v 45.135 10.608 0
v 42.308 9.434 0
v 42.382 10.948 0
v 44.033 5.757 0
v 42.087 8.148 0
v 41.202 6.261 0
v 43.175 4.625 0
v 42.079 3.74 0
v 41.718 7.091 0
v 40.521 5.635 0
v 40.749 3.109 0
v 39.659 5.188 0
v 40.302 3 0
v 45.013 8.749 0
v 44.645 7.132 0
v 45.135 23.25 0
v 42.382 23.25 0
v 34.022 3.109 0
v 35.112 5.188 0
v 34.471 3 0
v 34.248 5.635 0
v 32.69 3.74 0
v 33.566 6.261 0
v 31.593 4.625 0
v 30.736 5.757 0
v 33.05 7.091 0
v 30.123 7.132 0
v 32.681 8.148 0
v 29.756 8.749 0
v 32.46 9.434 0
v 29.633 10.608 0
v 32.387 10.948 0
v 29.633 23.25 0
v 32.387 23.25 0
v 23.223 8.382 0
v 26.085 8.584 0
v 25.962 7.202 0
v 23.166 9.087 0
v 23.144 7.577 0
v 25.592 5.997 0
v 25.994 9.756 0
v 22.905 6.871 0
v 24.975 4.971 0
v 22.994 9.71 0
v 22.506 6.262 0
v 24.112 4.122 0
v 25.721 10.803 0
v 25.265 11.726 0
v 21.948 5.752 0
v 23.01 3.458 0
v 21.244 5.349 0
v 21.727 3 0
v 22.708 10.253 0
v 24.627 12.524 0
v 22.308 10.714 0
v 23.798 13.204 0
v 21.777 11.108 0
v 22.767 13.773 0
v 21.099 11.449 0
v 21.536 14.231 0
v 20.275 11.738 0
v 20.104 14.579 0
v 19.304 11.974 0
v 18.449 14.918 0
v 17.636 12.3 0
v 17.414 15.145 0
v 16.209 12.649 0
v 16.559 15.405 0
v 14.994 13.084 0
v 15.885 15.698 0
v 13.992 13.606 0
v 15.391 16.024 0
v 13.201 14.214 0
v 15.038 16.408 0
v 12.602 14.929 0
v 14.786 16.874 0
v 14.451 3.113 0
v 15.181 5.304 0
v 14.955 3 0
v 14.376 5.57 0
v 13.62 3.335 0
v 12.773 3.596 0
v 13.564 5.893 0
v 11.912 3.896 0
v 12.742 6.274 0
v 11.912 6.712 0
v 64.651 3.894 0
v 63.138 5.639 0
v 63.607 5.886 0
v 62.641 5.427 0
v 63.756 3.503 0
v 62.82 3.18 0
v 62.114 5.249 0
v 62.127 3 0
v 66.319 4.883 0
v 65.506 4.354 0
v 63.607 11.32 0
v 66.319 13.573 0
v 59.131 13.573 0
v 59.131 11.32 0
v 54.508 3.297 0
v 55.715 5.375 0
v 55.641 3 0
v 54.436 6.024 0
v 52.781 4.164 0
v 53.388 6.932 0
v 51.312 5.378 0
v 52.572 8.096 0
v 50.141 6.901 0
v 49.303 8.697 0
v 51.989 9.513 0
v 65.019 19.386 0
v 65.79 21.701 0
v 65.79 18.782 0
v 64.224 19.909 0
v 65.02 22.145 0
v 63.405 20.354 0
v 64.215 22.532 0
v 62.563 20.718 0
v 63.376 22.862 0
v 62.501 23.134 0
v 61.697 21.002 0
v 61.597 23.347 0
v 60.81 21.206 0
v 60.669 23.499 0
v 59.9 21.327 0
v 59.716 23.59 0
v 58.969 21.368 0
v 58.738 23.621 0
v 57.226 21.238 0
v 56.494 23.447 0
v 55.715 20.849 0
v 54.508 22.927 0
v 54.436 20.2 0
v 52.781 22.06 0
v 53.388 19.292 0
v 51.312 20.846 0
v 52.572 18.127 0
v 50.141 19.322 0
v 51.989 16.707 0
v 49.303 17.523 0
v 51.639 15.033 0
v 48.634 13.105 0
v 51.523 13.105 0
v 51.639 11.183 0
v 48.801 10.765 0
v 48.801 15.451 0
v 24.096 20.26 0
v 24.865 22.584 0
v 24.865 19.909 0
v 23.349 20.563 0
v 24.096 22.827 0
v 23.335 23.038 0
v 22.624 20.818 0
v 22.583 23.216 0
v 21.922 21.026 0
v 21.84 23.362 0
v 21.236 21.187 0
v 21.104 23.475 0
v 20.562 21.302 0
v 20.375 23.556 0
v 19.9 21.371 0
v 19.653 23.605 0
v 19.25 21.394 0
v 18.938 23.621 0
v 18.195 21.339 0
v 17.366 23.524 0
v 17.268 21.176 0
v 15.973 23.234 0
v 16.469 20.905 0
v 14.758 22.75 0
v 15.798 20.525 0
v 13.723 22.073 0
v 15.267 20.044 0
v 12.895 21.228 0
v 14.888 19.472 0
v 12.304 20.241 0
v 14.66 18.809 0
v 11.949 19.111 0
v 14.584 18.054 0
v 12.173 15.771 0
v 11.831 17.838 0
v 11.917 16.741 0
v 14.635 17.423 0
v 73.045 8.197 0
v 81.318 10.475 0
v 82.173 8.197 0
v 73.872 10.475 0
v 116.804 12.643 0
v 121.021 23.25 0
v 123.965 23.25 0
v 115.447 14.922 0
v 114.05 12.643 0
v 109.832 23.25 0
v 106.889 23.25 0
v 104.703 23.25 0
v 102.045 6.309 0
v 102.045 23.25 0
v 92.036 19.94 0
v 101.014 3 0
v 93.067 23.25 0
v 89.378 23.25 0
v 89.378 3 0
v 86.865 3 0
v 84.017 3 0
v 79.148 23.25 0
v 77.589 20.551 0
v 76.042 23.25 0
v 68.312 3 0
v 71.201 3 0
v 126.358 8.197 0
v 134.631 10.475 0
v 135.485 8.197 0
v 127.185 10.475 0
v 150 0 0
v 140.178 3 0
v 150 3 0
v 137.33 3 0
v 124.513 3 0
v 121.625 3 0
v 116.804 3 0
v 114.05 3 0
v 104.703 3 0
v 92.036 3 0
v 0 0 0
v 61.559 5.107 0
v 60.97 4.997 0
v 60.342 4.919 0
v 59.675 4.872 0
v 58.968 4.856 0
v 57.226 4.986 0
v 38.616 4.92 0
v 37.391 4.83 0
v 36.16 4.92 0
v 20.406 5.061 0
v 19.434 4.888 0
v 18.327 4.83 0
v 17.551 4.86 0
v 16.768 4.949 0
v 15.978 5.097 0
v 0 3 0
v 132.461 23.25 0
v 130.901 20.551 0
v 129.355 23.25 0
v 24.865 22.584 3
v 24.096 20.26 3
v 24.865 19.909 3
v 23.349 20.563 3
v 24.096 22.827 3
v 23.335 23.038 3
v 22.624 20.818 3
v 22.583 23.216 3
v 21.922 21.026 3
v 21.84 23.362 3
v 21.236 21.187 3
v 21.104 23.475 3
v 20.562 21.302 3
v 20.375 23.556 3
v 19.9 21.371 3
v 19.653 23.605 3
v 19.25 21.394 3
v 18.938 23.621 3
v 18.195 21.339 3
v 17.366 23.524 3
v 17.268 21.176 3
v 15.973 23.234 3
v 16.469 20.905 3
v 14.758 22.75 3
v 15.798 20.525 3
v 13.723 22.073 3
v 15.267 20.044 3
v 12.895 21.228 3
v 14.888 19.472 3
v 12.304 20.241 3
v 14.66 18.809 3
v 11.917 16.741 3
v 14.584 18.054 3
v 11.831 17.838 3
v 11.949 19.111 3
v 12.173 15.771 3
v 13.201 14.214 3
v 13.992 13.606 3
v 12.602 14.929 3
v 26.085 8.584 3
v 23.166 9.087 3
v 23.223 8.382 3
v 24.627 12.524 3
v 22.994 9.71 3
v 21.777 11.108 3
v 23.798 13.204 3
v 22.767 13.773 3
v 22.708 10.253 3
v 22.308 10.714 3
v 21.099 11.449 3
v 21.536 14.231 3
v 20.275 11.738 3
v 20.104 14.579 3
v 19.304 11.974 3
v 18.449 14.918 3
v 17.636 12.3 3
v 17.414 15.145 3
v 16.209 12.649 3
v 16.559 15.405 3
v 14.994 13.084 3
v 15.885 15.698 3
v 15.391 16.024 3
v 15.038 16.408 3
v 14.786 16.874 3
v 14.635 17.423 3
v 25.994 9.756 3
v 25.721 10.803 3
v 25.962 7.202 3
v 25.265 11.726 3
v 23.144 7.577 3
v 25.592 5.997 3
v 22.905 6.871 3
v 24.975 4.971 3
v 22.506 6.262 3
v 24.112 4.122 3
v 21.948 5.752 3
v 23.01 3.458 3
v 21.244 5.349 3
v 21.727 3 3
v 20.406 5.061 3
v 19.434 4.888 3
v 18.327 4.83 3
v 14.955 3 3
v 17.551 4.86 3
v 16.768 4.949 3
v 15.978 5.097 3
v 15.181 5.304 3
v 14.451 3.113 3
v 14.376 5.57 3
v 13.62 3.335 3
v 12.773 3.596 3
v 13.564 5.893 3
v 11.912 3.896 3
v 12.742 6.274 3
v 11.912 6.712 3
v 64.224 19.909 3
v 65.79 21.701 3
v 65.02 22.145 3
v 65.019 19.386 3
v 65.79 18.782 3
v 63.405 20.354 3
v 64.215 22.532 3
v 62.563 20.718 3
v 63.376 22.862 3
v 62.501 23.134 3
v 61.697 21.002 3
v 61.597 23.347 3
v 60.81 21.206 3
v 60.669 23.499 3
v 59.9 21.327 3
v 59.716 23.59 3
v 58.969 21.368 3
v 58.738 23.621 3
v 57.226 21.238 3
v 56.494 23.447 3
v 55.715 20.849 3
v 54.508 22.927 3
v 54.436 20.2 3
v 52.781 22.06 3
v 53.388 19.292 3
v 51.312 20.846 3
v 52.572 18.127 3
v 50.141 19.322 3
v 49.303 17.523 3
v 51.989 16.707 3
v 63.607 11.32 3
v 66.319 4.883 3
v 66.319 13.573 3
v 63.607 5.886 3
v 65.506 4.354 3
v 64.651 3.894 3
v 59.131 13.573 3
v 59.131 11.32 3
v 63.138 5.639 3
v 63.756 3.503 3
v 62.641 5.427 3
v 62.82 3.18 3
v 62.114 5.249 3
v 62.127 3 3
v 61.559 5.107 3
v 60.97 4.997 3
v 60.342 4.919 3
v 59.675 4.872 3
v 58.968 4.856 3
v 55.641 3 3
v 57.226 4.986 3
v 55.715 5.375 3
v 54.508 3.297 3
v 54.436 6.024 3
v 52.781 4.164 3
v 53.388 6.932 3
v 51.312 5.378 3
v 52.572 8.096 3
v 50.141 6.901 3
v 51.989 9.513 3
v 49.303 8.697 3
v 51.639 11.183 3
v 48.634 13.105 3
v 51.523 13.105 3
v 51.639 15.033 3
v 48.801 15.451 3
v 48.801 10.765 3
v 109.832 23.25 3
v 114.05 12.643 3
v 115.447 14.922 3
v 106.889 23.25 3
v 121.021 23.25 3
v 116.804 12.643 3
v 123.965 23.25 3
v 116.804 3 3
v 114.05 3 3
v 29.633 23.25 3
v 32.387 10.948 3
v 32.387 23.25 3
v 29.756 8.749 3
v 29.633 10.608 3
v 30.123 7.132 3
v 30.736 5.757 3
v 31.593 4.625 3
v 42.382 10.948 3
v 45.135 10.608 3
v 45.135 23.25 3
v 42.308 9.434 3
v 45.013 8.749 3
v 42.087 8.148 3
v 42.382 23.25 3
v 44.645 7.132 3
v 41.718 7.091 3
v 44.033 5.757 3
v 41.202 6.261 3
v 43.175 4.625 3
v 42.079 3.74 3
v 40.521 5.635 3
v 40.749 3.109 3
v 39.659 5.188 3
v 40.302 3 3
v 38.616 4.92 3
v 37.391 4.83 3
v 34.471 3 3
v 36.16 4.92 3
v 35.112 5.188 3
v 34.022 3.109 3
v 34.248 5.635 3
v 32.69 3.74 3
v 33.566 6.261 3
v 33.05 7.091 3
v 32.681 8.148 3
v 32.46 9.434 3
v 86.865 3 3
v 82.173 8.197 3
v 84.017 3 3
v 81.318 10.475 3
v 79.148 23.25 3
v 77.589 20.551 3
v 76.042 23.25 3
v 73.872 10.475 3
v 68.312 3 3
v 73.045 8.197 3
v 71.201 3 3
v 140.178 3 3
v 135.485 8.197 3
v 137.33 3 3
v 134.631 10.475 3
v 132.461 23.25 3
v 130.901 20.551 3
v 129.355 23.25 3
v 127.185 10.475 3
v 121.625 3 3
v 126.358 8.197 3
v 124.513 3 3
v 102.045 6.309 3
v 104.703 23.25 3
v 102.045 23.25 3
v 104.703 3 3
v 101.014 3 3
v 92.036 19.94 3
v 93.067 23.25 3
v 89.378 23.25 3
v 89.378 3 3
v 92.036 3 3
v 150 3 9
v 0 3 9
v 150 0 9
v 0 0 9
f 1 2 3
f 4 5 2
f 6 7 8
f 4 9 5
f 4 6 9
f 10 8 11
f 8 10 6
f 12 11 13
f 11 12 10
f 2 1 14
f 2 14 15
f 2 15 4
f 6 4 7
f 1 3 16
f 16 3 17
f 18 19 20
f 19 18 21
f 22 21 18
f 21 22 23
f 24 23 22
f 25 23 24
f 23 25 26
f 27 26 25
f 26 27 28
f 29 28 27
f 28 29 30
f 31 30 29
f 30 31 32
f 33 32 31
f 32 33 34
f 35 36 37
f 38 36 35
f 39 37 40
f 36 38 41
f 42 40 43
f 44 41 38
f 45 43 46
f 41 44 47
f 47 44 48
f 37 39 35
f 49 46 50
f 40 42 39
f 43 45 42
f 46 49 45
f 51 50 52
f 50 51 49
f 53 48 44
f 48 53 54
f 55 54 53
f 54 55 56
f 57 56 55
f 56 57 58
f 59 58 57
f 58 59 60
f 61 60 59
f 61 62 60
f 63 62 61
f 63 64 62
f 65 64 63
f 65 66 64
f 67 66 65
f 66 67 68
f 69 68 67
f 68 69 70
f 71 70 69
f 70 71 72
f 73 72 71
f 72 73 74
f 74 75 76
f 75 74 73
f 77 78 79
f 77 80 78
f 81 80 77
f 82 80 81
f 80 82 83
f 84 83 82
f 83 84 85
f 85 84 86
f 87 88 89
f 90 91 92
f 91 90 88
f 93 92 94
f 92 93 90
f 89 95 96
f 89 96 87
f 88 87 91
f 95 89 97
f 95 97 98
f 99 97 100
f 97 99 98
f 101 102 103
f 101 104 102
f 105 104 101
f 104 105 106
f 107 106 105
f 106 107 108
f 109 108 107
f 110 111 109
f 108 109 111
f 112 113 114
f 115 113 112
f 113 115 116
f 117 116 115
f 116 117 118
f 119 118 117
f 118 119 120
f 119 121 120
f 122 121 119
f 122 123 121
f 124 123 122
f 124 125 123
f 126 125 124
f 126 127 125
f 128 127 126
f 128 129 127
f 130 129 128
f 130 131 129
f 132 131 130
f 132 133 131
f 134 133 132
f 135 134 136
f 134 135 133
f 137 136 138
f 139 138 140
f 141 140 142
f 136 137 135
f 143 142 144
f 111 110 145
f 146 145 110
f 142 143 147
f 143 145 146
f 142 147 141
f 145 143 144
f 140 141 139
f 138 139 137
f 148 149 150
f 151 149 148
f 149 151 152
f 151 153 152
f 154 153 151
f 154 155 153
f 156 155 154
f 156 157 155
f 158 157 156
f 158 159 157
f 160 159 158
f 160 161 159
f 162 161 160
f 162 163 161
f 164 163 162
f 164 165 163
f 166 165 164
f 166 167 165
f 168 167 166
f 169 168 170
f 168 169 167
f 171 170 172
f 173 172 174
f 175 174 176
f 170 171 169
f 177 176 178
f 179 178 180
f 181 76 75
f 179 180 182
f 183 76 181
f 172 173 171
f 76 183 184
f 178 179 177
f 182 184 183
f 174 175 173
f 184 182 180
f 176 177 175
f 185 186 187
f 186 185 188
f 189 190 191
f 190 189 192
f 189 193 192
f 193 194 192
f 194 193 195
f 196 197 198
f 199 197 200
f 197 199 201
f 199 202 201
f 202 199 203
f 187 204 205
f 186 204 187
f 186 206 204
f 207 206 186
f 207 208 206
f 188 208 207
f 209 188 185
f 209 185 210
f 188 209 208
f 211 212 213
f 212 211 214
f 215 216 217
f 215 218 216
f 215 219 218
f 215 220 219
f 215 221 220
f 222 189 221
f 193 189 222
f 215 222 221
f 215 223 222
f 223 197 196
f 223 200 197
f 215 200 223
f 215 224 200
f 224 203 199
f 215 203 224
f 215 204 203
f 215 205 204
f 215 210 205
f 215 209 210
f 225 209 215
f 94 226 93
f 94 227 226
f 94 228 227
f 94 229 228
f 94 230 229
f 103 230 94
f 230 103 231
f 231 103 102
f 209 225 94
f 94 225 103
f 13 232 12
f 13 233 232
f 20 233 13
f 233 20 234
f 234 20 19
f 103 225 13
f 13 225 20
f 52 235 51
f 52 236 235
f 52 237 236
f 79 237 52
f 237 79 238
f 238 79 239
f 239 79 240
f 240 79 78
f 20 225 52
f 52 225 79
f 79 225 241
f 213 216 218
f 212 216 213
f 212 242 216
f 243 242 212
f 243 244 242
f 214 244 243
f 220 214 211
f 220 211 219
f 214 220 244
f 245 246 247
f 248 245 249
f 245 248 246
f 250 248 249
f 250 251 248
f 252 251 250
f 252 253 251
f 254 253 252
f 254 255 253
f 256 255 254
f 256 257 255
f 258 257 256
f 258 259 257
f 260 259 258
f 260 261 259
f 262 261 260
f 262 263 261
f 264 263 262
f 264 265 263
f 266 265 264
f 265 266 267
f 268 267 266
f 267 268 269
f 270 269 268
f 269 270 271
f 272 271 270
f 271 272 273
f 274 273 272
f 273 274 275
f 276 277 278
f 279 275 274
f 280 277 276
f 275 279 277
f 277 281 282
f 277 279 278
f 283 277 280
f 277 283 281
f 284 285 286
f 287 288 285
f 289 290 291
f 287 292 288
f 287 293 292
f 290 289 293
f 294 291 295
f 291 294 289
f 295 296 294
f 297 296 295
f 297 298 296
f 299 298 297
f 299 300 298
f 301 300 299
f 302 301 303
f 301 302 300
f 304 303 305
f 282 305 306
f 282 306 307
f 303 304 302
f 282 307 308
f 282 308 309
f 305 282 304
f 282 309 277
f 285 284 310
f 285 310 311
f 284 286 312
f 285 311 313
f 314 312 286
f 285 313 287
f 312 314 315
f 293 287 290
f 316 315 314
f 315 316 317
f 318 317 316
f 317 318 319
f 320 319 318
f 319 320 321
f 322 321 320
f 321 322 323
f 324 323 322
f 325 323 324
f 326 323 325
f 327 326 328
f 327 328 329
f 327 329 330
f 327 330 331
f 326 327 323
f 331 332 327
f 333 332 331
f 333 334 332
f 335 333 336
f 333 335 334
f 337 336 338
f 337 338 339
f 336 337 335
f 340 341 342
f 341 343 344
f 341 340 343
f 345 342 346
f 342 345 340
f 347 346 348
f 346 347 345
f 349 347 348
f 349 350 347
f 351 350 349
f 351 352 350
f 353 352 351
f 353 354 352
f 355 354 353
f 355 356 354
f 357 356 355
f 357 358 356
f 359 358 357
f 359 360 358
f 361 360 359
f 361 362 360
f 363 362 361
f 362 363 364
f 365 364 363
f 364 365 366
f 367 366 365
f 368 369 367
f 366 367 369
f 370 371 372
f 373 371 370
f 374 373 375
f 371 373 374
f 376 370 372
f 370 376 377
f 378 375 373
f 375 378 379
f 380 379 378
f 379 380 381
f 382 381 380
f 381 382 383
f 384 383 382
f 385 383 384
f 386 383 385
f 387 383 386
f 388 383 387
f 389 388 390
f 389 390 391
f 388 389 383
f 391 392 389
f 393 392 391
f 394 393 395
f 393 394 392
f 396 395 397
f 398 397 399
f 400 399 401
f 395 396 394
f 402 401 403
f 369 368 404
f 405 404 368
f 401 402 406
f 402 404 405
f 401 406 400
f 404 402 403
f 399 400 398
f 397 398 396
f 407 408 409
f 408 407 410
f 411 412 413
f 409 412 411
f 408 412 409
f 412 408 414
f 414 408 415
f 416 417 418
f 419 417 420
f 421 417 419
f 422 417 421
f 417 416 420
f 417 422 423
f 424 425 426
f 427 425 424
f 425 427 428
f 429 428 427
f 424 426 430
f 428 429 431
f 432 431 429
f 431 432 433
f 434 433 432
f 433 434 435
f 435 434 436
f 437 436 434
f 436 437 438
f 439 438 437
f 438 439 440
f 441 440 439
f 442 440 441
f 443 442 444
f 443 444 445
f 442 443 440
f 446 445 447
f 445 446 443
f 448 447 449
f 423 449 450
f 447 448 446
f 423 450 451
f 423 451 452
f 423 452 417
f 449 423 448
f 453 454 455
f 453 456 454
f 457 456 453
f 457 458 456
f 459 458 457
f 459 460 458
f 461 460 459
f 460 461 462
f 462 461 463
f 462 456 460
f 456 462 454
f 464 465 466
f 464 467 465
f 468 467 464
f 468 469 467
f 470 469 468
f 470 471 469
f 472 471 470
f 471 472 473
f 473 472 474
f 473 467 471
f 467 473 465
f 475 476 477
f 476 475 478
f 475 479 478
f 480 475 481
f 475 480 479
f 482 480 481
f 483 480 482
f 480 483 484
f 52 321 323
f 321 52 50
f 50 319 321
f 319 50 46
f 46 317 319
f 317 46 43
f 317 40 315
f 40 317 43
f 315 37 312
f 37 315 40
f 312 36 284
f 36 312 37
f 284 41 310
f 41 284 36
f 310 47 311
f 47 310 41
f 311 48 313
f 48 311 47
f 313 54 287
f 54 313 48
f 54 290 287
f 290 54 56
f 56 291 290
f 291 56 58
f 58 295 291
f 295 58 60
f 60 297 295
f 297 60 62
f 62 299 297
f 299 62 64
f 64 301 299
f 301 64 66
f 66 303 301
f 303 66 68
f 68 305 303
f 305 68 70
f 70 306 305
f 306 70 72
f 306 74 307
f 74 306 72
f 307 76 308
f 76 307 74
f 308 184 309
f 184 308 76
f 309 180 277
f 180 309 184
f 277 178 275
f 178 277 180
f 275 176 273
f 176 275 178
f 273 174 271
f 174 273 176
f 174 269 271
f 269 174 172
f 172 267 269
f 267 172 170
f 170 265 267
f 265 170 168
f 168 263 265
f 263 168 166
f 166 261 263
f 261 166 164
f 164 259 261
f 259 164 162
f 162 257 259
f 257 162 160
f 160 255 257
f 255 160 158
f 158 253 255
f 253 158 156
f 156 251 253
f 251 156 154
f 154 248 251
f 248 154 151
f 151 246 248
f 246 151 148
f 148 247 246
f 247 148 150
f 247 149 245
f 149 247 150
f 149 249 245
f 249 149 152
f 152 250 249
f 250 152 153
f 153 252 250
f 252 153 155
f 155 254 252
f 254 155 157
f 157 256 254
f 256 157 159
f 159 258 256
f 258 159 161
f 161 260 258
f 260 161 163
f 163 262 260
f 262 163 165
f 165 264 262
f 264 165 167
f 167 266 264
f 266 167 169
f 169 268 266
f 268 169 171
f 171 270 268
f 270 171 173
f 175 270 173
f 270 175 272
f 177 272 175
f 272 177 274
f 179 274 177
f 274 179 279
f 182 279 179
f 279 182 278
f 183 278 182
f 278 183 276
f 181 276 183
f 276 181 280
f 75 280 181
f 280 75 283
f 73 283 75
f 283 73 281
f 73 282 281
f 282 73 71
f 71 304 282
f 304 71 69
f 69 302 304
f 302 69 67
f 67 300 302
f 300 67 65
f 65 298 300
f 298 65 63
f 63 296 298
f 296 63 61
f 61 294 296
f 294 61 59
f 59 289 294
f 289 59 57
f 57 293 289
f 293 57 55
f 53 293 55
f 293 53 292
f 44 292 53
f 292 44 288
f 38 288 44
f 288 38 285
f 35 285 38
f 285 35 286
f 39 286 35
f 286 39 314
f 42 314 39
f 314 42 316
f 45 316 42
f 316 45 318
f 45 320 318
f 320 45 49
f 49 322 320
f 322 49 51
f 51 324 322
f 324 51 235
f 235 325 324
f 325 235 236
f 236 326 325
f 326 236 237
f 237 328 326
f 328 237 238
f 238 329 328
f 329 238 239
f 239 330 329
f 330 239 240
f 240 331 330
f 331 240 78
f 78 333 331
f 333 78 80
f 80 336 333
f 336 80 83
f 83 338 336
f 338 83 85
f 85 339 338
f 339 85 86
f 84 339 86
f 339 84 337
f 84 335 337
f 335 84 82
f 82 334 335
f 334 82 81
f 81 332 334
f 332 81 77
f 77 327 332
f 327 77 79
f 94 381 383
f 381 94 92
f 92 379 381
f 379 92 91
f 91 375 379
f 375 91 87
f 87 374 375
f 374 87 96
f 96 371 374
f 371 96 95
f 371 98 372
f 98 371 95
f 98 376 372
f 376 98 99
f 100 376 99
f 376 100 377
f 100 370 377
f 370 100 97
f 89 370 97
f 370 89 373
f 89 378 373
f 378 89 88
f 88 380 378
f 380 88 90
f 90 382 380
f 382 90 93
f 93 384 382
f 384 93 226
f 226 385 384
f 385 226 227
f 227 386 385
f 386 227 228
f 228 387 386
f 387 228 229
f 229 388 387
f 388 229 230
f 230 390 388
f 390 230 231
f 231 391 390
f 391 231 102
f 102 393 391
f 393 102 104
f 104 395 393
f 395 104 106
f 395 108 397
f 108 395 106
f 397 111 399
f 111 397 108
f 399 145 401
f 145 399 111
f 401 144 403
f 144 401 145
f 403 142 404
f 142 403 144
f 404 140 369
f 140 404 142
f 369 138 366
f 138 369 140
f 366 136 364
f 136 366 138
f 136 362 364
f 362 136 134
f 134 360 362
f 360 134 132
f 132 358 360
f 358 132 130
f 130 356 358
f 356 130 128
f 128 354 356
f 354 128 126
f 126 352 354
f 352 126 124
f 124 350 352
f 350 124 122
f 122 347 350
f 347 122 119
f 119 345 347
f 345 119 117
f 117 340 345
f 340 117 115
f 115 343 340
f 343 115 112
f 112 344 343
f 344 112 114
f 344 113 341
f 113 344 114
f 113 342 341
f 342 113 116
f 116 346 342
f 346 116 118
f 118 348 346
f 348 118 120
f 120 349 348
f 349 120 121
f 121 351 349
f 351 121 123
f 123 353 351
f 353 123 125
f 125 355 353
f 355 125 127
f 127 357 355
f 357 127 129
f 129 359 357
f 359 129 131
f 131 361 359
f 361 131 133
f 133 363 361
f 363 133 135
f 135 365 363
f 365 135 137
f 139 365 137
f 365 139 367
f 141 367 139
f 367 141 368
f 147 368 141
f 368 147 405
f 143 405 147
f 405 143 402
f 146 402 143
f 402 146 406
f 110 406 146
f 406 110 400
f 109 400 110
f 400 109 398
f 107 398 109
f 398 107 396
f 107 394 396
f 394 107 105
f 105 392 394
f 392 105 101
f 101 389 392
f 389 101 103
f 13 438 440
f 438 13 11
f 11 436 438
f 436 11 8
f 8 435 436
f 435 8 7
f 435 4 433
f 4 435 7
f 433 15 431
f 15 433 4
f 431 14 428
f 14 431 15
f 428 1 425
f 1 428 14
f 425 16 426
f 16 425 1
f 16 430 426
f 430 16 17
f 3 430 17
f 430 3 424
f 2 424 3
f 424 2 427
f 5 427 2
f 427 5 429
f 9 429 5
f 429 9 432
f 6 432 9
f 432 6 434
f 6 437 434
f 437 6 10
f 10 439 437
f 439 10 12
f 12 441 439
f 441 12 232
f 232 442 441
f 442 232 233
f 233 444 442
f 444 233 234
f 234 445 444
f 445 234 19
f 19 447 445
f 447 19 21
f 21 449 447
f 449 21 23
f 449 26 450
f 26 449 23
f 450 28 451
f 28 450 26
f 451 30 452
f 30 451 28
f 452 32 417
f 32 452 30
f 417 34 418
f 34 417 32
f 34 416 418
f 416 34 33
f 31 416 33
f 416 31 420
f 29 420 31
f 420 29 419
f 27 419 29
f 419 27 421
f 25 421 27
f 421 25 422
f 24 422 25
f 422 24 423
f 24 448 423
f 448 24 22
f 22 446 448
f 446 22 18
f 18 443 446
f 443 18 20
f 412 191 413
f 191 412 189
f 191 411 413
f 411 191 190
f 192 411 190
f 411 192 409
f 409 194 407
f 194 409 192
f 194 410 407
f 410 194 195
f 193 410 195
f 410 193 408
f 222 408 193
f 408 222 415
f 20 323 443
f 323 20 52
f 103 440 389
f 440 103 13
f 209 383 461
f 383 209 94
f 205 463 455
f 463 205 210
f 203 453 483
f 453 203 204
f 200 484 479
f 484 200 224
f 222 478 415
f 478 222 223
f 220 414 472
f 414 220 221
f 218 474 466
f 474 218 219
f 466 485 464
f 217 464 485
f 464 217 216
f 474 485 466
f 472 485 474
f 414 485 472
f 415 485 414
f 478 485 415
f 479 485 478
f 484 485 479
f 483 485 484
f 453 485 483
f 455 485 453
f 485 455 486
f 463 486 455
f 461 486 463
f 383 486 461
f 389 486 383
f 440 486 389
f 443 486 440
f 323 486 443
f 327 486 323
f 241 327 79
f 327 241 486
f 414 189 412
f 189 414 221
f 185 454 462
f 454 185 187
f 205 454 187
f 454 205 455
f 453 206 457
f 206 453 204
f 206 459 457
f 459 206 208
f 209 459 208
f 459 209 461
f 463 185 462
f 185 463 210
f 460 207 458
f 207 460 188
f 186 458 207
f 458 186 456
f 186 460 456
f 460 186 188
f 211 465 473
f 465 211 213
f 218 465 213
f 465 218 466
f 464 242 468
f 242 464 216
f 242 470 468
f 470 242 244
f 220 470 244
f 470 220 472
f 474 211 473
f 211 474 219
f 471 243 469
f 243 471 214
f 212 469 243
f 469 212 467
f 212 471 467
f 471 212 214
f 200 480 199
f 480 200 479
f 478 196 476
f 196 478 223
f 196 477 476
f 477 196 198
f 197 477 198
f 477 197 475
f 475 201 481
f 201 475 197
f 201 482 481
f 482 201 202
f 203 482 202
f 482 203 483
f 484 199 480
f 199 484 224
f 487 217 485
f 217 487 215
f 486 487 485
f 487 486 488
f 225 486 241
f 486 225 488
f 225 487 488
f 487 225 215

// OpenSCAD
translate([10, 3, 0])
linear_extrude(height=3)
    text("SUGANYA", 20, "Cascadia Code Semibold");

cube([150, 3, 9]);
